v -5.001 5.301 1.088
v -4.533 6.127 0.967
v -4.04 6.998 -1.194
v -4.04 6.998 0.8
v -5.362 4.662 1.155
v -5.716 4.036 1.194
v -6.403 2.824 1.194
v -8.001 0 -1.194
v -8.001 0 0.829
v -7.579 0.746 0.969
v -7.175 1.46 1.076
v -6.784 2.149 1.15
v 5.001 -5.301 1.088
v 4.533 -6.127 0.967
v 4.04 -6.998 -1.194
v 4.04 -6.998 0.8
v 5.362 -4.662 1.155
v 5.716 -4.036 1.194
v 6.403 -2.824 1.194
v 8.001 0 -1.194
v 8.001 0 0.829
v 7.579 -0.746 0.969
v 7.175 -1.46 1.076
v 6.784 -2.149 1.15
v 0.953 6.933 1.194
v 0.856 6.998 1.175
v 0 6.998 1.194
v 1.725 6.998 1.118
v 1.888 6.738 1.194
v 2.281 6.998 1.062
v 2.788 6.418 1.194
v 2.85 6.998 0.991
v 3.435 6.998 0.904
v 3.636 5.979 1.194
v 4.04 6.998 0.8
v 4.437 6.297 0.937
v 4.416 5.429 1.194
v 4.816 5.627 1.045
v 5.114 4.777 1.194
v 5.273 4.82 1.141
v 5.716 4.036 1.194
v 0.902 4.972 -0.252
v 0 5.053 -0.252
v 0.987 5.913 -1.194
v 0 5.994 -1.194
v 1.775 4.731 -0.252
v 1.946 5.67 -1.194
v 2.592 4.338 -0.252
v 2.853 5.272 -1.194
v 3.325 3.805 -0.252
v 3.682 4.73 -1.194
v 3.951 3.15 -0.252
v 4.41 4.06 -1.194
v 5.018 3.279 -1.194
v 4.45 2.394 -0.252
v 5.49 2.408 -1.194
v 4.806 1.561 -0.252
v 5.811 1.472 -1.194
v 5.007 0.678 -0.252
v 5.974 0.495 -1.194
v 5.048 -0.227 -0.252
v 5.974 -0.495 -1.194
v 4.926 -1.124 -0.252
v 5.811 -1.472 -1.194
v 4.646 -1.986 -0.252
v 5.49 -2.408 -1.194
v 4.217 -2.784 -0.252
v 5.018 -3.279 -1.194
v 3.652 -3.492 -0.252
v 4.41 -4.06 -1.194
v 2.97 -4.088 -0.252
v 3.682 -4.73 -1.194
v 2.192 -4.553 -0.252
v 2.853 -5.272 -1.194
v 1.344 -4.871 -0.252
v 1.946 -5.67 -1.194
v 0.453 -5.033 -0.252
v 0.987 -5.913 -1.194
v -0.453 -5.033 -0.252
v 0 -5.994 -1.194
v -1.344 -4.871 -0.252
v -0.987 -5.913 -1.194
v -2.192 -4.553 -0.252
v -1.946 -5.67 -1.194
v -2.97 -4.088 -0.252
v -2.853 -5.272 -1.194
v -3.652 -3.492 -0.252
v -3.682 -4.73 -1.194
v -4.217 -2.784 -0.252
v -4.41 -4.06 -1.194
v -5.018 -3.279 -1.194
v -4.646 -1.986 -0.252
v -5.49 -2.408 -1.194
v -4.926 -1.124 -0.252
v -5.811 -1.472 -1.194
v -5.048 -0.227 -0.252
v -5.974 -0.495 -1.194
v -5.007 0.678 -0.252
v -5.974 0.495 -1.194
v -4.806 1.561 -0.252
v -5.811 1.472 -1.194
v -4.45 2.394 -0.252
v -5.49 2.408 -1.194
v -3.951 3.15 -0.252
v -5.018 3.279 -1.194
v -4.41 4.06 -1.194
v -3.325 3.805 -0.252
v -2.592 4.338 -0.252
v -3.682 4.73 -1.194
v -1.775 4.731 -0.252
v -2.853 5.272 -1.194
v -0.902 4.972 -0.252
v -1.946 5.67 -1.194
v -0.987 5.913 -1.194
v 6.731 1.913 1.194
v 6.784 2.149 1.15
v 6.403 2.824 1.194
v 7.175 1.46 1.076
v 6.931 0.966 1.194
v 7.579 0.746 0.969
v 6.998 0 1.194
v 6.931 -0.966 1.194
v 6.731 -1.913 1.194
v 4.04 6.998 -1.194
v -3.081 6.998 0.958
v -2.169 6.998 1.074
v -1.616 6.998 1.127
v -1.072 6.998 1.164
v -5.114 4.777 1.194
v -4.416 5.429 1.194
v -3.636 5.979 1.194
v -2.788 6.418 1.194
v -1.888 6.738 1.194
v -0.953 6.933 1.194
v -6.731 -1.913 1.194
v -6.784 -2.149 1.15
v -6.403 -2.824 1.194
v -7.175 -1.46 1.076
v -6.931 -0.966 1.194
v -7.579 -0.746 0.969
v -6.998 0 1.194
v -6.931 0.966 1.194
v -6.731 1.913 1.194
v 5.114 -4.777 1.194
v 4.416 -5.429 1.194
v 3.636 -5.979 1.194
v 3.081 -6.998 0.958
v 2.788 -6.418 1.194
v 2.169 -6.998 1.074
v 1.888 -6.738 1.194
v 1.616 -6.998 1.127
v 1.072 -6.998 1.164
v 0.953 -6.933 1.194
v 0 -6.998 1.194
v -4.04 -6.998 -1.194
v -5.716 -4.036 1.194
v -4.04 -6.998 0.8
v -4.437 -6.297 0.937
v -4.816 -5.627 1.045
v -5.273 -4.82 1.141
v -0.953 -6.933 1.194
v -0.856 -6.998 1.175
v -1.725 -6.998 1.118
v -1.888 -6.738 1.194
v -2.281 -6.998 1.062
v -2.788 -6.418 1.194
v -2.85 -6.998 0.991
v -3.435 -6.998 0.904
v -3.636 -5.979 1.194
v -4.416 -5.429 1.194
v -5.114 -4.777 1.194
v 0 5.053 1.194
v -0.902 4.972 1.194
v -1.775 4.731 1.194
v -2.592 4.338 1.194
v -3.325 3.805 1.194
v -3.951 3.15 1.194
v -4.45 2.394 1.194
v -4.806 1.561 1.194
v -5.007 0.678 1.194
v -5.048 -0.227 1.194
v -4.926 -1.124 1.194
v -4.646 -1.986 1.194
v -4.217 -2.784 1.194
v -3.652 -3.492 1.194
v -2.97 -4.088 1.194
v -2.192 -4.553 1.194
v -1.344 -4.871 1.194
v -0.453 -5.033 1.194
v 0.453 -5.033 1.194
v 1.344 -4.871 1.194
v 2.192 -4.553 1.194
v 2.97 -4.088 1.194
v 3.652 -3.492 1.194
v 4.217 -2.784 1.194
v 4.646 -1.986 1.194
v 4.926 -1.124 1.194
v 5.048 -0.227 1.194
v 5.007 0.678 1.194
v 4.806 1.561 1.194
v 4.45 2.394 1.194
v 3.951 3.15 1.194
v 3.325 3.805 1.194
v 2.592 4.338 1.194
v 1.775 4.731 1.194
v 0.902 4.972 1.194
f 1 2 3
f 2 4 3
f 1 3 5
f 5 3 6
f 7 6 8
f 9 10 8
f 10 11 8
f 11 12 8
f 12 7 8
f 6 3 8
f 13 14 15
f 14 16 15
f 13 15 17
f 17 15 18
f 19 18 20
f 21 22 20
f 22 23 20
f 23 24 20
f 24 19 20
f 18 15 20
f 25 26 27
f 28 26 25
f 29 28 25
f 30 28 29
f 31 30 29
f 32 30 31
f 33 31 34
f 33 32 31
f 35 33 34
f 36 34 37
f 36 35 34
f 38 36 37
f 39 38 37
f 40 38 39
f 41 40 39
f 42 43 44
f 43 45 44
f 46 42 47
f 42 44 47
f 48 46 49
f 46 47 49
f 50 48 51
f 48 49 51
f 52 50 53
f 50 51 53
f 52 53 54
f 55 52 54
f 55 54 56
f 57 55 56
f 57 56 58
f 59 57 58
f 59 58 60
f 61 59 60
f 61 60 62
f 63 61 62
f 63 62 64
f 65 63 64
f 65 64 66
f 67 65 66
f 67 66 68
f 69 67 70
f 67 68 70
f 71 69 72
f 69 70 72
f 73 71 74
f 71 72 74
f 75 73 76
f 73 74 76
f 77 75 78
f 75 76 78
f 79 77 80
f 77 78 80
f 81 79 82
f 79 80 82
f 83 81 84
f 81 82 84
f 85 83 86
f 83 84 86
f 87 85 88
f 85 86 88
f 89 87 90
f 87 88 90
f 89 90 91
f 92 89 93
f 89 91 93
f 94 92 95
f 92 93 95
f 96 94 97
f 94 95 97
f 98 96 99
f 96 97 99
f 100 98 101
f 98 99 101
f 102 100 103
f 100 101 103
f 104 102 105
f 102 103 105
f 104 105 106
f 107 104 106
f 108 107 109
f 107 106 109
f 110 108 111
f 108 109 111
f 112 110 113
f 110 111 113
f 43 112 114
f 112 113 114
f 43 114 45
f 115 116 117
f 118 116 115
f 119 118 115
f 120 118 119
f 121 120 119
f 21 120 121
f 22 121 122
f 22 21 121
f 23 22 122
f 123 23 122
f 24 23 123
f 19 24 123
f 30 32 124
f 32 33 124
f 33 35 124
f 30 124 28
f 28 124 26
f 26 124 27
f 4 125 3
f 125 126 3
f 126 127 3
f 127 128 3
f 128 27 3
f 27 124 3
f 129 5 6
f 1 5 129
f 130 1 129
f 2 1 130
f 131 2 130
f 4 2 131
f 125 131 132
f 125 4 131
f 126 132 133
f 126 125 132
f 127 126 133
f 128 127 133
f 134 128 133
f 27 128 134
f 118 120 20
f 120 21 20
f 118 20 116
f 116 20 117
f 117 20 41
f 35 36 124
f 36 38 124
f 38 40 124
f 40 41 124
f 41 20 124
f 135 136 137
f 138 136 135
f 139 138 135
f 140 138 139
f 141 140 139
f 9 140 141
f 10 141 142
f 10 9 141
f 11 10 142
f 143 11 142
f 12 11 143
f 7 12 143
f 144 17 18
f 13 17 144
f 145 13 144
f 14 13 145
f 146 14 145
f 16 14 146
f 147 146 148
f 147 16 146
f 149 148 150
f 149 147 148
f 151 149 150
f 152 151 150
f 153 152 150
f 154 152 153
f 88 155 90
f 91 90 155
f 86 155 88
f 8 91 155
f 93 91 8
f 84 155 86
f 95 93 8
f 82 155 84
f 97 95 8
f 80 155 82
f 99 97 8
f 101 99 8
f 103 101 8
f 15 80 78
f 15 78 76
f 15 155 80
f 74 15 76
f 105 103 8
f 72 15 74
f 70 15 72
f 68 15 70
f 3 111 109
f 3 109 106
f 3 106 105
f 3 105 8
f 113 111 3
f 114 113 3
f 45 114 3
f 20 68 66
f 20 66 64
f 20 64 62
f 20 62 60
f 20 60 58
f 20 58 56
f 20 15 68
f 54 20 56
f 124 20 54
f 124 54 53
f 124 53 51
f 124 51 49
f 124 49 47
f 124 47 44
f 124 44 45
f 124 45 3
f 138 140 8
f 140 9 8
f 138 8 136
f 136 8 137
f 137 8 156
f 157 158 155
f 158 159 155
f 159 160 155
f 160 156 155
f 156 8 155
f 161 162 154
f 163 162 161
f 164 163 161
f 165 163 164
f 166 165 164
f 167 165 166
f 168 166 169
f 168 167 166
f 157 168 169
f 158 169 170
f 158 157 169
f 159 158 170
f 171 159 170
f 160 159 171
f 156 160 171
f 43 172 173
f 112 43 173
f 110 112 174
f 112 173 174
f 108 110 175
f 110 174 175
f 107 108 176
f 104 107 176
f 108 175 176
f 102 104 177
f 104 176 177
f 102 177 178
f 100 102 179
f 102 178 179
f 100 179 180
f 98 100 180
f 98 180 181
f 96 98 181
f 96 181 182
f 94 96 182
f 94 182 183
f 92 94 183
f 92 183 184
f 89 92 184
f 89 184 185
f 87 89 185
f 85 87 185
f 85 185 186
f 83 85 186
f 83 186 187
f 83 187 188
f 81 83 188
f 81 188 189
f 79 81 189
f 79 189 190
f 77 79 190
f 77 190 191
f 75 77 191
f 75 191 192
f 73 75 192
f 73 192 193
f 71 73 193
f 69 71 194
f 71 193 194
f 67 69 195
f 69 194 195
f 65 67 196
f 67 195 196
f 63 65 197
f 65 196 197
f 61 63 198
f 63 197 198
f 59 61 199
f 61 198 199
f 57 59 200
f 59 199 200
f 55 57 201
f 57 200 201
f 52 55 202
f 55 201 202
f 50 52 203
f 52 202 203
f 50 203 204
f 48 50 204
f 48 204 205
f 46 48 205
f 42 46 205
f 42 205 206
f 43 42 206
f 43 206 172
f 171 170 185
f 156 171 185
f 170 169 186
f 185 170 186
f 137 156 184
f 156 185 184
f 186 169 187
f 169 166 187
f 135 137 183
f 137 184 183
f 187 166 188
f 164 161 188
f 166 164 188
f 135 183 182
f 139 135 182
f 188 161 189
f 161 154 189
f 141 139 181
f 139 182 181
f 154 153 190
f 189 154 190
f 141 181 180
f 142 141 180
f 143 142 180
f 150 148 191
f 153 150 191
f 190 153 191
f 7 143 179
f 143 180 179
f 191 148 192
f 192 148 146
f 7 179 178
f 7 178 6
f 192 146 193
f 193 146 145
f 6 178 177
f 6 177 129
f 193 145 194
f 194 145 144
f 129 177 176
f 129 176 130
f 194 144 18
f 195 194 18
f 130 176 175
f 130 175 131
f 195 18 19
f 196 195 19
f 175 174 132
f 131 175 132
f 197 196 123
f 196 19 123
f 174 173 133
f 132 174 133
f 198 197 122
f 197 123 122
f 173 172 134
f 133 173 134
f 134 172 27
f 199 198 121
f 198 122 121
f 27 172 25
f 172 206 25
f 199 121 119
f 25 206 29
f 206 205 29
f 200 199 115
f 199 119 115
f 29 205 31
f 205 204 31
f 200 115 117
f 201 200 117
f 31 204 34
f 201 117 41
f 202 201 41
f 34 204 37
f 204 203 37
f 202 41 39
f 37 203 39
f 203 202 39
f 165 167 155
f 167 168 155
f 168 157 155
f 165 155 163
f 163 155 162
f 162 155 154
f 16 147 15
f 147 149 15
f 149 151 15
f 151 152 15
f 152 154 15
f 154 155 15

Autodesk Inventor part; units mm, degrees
sketch "Sketch_1" plane through (0, 0, 0) normal (1, 0, 0) x (0, 1, 0)
  line L0 (0, -1.1938) -> (0, 1.1938)
  line L1 (0, 1.1938) -> (6.9977, 1.1938)
  line L2 (6.9977, 1.1938) -> (8.3972, 0.6844)
  line L3 (8.3972, 0.6844) -> (8.3972, -1.1938)
  line L4 (8.3972, -1.1938) -> (0, -1.1938)
  line L5 (0, -1.1938) -> (0, 1.1938)
revolve "Revolution1" add sketch "Sketch_1" angle 360 about axis through (0, 0, -1.1938) along (0, 0, -1)
sketch "Sketch_2" plane through (0, 0, 0) normal (0, 0, 1) x (1, 0, 0)
  line L0 (-13.9954, 13.9954) -> (-13.9954, -13.9954)
  line L1 (-13.9954, -13.9954) -> (13.9954, -13.9954)
  line L2 (13.9954, -13.9954) -> (13.9954, 13.9954)
  line L3 (13.9954, 13.9954) -> (-13.9954, 13.9954)
  line L4 (-8.001, 0) -> (-4.0401, -6.9977)
  line L5 (-4.0401, -6.9977) -> (4.0401, -6.9977)
  line L6 (4.0401, -6.9977) -> (8.001, 0)
  line L7 (8.001, 0) -> (4.0401, 6.9977)
  line L8 (4.0401, 6.9977) -> (-4.0401, 6.9977)
  line L9 (-4.0401, 6.9977) -> (-8.001, 0)
extrude "Extrusion1" cut sketch "Sketch_2" along normal mid plane 4.7752
sketch "Sketch3" plane through (4.0401, 6.9977, -1.1938) normal (0, 0, -1) x (-1, 0, 0)
  point P0 (4.0401, -6.9977)
hole "Drilling 1" at (0, 0, -1.1938) direction (0, 0, 1) diameter 10.106 depth 2.3876 countersink diameter 11.9888 countersink angle 90
ref_plane "nut_XY" through (0, 0, -1.1938) normal (0, 0, 1) x (1, 0, 0)
ref_plane "nut_YZ" through (0, 0, -1.1938) normal (1, 0, 0) x (0, 1, 0)
ref_plane "nut_ZX" through (0, 0, -1.1938) normal (0, 1, 0) x (0, 0, 1)
properties part number "AT503M"
